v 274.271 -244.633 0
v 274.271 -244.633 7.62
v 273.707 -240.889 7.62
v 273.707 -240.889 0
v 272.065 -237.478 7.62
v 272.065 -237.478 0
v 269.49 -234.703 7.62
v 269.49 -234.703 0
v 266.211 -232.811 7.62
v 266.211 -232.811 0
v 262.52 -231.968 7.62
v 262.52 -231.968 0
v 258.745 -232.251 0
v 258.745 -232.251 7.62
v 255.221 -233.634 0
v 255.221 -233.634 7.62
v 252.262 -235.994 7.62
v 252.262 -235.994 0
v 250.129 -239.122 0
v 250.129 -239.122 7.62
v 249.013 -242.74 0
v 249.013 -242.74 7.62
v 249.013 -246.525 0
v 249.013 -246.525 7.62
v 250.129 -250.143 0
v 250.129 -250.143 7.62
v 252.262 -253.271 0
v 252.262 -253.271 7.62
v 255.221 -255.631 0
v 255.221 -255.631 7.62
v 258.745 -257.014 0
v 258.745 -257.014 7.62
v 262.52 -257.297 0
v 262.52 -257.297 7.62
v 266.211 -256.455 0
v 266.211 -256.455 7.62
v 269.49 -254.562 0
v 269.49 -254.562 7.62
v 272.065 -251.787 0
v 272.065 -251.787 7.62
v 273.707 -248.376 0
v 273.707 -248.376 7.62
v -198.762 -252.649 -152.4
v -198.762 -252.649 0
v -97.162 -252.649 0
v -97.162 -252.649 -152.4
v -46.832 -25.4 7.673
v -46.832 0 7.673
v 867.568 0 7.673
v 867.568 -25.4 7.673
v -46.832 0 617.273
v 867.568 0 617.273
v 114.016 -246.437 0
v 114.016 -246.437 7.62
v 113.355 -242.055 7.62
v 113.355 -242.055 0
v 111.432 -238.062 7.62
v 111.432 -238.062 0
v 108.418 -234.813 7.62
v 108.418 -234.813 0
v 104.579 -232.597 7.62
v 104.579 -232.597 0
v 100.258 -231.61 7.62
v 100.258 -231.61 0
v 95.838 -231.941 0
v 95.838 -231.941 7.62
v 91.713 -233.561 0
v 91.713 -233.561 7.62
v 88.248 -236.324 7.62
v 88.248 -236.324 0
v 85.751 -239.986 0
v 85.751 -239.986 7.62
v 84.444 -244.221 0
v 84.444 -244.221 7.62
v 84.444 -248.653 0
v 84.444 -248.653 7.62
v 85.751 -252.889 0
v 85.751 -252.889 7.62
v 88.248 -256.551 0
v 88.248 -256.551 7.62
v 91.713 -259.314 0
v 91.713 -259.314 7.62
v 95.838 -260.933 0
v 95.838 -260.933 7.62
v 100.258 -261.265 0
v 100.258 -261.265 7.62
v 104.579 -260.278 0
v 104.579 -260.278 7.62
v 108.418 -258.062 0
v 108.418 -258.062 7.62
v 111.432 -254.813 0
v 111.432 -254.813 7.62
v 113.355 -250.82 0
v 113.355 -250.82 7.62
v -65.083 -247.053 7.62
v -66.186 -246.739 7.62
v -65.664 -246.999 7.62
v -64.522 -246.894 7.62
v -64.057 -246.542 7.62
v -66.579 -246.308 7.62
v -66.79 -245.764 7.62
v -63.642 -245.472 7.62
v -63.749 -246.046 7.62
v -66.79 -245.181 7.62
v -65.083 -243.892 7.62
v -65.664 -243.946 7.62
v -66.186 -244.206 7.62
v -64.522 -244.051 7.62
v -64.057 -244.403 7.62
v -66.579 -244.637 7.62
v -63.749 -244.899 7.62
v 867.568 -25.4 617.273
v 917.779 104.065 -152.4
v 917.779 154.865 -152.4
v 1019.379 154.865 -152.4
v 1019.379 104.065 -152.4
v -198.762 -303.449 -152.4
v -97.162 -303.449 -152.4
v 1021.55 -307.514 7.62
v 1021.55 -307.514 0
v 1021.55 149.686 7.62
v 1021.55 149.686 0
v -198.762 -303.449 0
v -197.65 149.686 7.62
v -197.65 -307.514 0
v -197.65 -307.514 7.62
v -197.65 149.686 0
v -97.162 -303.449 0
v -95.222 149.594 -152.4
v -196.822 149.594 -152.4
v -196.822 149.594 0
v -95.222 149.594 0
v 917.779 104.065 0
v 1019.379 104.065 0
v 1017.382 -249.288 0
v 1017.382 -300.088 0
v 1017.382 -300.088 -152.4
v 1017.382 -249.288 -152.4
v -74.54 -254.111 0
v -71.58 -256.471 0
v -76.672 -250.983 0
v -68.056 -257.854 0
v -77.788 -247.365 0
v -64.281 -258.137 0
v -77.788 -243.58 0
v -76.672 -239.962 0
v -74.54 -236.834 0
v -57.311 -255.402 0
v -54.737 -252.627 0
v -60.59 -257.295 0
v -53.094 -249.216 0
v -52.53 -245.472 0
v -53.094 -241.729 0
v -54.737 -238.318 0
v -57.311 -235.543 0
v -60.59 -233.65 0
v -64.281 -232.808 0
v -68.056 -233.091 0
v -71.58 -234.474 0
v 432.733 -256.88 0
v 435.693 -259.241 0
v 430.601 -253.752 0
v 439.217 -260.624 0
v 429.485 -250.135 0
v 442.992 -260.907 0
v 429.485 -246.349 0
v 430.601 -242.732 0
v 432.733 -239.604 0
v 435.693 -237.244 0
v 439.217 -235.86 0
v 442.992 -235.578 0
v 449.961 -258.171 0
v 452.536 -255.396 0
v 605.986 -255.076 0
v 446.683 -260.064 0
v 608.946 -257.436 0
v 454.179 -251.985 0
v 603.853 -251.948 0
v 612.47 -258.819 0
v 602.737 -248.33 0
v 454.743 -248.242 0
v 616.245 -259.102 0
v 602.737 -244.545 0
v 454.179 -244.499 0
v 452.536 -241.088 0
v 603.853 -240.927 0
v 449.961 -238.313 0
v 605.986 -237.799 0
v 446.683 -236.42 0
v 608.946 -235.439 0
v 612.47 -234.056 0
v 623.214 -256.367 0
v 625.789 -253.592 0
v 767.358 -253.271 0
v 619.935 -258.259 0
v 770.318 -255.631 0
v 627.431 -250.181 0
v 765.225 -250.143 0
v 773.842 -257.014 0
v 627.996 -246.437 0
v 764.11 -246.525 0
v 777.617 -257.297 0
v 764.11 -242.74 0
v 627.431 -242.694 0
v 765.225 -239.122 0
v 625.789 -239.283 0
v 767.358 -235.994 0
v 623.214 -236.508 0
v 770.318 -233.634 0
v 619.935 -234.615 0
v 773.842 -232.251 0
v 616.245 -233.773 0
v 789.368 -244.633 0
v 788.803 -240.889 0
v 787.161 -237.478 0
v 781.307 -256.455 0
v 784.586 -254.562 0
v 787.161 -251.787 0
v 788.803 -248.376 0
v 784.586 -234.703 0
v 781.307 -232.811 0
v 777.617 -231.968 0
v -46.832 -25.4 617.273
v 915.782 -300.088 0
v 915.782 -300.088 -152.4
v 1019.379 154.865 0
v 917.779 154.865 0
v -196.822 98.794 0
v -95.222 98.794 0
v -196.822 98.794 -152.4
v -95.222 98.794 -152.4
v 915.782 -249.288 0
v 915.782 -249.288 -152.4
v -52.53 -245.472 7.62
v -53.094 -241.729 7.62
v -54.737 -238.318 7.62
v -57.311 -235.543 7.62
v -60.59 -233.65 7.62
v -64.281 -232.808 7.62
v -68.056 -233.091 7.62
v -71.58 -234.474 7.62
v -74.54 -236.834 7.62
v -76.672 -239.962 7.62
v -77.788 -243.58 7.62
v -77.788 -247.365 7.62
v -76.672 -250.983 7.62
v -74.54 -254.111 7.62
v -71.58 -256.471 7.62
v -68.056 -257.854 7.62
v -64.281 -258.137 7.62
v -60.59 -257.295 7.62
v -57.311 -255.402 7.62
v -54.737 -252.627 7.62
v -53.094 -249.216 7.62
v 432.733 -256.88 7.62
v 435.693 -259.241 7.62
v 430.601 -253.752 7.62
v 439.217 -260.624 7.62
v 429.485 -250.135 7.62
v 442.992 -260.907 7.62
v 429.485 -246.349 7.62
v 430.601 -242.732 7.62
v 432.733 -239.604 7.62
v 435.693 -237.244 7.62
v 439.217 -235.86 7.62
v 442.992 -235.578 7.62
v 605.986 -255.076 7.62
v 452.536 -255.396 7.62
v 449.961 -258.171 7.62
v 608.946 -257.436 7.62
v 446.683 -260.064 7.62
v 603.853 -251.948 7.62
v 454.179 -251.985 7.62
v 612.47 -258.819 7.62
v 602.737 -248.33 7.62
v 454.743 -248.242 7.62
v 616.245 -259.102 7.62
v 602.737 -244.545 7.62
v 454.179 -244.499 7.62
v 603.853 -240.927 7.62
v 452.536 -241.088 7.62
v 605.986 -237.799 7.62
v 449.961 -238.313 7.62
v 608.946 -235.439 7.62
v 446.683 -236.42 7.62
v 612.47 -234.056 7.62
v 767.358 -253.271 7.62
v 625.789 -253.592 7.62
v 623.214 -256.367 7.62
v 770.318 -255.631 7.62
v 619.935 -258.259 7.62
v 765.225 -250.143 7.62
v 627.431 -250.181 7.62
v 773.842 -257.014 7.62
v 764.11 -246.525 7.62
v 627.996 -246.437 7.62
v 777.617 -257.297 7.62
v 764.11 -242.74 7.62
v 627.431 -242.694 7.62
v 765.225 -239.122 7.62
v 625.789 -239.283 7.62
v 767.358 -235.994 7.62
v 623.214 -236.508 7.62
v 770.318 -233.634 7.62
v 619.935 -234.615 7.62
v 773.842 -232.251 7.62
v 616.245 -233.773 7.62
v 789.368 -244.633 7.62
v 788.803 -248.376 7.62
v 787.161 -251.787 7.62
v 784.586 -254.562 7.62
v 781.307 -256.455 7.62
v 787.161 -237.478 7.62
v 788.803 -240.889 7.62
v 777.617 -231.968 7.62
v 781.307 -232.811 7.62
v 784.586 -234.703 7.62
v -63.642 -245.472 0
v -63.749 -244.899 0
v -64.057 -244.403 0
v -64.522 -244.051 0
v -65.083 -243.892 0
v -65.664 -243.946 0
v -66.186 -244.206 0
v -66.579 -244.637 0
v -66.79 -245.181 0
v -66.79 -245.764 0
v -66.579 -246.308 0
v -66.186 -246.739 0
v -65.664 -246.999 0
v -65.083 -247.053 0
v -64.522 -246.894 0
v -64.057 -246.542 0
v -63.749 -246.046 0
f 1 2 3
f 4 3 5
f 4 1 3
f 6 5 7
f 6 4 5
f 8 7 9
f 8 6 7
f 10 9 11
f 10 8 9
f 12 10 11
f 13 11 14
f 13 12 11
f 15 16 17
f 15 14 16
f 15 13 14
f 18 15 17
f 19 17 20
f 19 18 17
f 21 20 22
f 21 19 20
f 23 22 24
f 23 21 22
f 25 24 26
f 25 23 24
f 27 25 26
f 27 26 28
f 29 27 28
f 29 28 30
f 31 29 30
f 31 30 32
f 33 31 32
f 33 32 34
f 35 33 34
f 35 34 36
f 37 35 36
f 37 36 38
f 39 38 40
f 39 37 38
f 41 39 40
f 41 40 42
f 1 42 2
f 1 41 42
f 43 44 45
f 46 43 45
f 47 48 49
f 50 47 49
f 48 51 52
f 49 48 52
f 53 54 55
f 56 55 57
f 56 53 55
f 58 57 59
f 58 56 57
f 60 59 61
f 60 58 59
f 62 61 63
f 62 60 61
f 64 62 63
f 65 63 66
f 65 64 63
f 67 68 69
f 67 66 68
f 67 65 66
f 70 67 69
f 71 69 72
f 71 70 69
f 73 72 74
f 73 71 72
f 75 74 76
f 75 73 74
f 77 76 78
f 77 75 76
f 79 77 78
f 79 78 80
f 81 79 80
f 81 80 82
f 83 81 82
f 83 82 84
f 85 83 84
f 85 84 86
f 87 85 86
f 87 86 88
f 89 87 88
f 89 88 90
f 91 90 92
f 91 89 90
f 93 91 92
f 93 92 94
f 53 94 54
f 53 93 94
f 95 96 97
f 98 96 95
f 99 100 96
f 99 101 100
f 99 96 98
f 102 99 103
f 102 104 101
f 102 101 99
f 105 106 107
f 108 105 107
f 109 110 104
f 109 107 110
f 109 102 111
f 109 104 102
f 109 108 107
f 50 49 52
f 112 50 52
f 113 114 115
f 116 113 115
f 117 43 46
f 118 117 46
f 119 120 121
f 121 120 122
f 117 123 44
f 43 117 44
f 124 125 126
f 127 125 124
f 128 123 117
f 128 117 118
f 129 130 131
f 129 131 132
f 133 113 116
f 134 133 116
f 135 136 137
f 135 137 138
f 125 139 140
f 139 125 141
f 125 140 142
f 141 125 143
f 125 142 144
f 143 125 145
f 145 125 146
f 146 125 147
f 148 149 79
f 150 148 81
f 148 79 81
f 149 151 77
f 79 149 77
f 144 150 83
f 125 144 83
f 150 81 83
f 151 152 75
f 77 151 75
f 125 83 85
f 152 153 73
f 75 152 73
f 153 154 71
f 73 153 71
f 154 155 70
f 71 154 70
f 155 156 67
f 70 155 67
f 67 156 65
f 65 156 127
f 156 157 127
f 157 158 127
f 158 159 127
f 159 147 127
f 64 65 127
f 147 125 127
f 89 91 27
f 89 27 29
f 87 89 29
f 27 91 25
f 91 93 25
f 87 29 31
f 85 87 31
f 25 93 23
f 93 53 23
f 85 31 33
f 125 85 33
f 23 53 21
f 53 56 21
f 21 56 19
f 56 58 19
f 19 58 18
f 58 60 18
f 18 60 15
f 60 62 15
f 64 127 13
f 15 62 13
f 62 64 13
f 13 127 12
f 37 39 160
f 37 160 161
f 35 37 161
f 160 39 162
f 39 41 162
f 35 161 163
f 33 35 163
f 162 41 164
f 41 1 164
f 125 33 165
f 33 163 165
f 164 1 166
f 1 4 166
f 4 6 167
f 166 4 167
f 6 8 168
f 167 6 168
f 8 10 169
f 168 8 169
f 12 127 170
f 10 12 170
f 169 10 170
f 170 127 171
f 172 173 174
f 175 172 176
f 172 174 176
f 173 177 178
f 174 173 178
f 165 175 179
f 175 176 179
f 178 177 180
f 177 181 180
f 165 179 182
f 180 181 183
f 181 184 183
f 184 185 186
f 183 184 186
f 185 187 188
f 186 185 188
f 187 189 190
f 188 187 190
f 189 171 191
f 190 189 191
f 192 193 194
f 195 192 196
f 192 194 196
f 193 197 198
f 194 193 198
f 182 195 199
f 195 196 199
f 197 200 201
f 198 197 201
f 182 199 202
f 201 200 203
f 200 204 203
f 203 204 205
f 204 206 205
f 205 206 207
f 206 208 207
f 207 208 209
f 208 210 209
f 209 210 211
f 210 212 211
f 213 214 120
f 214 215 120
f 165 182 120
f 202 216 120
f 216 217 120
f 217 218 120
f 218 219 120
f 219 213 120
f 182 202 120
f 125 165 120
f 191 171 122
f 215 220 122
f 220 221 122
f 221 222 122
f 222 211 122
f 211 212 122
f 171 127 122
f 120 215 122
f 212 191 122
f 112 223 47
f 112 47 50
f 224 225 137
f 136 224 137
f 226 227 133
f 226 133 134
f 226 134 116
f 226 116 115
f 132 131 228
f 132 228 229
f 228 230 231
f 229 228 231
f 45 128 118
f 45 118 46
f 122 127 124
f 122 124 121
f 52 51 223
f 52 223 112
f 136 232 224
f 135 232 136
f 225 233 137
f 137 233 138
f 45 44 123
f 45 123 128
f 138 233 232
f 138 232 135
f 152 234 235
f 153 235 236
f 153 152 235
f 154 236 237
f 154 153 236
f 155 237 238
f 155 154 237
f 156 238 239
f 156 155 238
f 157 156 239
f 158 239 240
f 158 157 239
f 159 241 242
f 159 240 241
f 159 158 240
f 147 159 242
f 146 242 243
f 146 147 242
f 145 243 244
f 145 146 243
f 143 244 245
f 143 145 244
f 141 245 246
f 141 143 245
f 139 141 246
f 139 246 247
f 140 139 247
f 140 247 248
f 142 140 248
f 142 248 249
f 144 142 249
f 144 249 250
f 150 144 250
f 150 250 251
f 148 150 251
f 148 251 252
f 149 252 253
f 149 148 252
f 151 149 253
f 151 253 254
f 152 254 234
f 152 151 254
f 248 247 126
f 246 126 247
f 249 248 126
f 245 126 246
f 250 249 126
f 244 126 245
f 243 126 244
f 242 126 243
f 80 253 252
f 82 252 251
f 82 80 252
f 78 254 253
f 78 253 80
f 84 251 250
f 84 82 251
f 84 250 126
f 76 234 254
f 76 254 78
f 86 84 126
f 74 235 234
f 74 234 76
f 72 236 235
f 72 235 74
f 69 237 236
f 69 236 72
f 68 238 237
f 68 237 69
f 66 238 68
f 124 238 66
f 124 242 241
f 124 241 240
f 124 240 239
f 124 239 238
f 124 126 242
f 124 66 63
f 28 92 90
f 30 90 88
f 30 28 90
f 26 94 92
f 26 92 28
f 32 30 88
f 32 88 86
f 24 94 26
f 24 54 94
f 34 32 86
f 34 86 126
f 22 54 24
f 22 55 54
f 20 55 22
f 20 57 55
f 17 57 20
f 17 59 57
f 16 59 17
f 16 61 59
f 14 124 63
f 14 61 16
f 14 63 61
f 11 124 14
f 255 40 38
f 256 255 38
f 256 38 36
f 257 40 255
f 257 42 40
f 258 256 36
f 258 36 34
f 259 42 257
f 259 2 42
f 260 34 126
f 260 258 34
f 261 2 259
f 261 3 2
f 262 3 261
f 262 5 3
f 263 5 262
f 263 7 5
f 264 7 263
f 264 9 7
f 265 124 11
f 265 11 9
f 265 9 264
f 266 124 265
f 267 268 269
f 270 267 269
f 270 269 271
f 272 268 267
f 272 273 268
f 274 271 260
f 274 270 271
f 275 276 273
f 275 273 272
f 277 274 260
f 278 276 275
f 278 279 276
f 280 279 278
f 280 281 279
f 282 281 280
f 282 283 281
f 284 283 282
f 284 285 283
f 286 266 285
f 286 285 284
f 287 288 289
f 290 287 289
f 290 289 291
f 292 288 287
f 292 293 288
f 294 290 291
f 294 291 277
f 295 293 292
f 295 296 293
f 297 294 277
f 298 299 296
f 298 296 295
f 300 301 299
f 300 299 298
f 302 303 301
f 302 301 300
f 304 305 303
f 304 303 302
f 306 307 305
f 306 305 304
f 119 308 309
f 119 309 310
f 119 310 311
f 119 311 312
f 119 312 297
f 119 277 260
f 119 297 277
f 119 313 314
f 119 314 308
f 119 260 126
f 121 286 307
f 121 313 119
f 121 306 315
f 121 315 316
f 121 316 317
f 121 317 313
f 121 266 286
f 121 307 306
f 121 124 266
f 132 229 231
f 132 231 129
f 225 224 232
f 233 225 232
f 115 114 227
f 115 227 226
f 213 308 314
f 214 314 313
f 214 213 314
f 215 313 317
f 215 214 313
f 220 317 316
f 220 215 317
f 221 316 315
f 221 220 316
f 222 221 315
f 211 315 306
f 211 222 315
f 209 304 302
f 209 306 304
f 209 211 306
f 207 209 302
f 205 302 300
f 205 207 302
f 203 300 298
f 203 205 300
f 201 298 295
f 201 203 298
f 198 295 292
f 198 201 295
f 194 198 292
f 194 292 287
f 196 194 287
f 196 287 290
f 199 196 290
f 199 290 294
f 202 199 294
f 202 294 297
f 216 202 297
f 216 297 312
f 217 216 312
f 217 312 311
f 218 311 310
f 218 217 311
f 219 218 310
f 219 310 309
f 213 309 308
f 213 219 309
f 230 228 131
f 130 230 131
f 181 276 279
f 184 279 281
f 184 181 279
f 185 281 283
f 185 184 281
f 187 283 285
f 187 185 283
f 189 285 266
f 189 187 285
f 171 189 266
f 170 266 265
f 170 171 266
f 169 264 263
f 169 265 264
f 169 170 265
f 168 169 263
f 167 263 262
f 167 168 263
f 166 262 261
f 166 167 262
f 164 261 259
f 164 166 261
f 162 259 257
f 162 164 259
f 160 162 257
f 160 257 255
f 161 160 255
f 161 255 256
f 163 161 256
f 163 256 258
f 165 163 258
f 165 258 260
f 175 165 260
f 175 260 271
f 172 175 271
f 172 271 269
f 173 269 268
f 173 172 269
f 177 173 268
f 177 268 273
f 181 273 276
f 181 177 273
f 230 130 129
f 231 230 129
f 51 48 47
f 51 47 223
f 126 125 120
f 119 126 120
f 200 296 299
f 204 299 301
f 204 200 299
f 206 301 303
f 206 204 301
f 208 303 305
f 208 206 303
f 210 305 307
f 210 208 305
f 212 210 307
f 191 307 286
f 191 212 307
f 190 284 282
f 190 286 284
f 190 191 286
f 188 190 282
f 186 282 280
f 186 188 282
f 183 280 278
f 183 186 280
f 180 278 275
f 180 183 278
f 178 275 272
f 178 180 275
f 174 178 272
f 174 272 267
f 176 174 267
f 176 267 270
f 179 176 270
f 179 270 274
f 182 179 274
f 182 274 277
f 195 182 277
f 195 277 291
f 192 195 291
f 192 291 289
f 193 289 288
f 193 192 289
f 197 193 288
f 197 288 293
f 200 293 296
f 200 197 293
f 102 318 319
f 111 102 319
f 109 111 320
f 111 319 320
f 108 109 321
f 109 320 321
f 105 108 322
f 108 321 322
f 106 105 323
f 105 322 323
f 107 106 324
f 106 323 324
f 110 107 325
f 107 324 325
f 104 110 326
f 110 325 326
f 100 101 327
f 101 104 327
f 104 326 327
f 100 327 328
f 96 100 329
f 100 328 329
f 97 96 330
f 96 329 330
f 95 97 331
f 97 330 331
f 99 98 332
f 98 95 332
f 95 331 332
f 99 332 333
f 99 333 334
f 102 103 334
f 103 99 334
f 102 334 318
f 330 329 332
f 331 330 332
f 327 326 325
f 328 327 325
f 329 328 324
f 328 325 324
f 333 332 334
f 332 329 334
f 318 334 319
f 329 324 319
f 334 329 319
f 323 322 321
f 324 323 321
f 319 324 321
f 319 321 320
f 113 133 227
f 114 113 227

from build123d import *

# Parameters (mm, degrees)
F0_W     = 914.4
F0_H     = 609.6
F1_DEPTH = 25.4
F4_W     = 101.6
F4_H     = 50.8
F5_DEPTH = 152.4
F6_W     = 1219.2
F6_H     = 457.2
F7_DEPTH = 7.62
F8_R     = 12.7
F8_R_2   = 1.5875
F8_R_3   = 14.868698601
F9_DEPTH = 617.2737575347


# Not quite as in the source:
# - the program builds the solid bodies; features that only make, move or delete a surface that nothing else refers to are left out


with BuildPart() as f1:
    # F0 (on Front) → F1 (new body)
    with BuildSketch(Plane.XZ):
        with Locations((410.367934819, 312.4727575347)):
            Rectangle(F0_W, F0_H)
    extrude(amount=F1_DEPTH)


with BuildPart() as f5:
    # F4 (on Top) → F5 (new body)
    with BuildSketch(Plane.XY):
        with Locations((-147.961716485, -278.0494519234)):
            Rectangle(F4_W, F4_H)
    extrude(amount=-F5_DEPTH)


with BuildPart() as f5b:
    # F4 (on Top) → F5, piece 2 (new body)
    with BuildSketch(Plane.XY):
        with Locations((968.5793860435, 129.4654405951)):
            Rectangle(F4_W, F4_H)
    extrude(amount=-F5_DEPTH)


with BuildPart() as f5c:
    # F4 (on Top) → F5, piece 3 (new body)
    with BuildSketch(Plane.XY):
        with Locations((966.5820940018, -274.6879585743)):
            Rectangle(F4_W, F4_H)
    extrude(amount=-F5_DEPTH)


with BuildPart() as f5d:
    # F4 (on Top) → F5, piece 4 (new body)
    with BuildSketch(Plane.XY):
        with Locations((-146.0218621969, 124.194490099)):
            Rectangle(F4_W, F4_H)
    extrude(amount=-F5_DEPTH)


with BuildPart() as f7:
    # F6 (on Top) → F7 (new body)
    with BuildSketch(Plane.XY):
        with Locations((411.9497016907, -78.913833046)):
            Rectangle(F6_W, F6_H)
    extrude(amount=F7_DEPTH)

    # F8 (on Top) → F9 (cut, through all)
    with BuildSketch(Plane.XY):
        with Locations((-65.2297735214, -245.472446084)):
            Circle(F8_R)
        with Locations((-65.2297735214, -245.472446084)):
            Circle(F8_R_2, mode=Mode.SUBTRACT)
        with Locations((99.1470590234, -246.4373856783)):
            Circle(F8_R_3)
        with Locations((261.5713775158, -244.6326613426)):
            Circle(F8_R)
        with Locations((442.0428872108, -248.2420802116)):
            Circle(F8_R)
        with Locations((615.2955293655, -246.4373856783)):
            Circle(F8_R)
        with Locations((776.6676545143, -244.6326613426)):
            Circle(F8_R)
    extrude(amount=F9_DEPTH, mode=Mode.SUBTRACT)


solid = Compound([f1.part, f5.part, f5b.part, f5c.part, f5d.part, f7.part])
